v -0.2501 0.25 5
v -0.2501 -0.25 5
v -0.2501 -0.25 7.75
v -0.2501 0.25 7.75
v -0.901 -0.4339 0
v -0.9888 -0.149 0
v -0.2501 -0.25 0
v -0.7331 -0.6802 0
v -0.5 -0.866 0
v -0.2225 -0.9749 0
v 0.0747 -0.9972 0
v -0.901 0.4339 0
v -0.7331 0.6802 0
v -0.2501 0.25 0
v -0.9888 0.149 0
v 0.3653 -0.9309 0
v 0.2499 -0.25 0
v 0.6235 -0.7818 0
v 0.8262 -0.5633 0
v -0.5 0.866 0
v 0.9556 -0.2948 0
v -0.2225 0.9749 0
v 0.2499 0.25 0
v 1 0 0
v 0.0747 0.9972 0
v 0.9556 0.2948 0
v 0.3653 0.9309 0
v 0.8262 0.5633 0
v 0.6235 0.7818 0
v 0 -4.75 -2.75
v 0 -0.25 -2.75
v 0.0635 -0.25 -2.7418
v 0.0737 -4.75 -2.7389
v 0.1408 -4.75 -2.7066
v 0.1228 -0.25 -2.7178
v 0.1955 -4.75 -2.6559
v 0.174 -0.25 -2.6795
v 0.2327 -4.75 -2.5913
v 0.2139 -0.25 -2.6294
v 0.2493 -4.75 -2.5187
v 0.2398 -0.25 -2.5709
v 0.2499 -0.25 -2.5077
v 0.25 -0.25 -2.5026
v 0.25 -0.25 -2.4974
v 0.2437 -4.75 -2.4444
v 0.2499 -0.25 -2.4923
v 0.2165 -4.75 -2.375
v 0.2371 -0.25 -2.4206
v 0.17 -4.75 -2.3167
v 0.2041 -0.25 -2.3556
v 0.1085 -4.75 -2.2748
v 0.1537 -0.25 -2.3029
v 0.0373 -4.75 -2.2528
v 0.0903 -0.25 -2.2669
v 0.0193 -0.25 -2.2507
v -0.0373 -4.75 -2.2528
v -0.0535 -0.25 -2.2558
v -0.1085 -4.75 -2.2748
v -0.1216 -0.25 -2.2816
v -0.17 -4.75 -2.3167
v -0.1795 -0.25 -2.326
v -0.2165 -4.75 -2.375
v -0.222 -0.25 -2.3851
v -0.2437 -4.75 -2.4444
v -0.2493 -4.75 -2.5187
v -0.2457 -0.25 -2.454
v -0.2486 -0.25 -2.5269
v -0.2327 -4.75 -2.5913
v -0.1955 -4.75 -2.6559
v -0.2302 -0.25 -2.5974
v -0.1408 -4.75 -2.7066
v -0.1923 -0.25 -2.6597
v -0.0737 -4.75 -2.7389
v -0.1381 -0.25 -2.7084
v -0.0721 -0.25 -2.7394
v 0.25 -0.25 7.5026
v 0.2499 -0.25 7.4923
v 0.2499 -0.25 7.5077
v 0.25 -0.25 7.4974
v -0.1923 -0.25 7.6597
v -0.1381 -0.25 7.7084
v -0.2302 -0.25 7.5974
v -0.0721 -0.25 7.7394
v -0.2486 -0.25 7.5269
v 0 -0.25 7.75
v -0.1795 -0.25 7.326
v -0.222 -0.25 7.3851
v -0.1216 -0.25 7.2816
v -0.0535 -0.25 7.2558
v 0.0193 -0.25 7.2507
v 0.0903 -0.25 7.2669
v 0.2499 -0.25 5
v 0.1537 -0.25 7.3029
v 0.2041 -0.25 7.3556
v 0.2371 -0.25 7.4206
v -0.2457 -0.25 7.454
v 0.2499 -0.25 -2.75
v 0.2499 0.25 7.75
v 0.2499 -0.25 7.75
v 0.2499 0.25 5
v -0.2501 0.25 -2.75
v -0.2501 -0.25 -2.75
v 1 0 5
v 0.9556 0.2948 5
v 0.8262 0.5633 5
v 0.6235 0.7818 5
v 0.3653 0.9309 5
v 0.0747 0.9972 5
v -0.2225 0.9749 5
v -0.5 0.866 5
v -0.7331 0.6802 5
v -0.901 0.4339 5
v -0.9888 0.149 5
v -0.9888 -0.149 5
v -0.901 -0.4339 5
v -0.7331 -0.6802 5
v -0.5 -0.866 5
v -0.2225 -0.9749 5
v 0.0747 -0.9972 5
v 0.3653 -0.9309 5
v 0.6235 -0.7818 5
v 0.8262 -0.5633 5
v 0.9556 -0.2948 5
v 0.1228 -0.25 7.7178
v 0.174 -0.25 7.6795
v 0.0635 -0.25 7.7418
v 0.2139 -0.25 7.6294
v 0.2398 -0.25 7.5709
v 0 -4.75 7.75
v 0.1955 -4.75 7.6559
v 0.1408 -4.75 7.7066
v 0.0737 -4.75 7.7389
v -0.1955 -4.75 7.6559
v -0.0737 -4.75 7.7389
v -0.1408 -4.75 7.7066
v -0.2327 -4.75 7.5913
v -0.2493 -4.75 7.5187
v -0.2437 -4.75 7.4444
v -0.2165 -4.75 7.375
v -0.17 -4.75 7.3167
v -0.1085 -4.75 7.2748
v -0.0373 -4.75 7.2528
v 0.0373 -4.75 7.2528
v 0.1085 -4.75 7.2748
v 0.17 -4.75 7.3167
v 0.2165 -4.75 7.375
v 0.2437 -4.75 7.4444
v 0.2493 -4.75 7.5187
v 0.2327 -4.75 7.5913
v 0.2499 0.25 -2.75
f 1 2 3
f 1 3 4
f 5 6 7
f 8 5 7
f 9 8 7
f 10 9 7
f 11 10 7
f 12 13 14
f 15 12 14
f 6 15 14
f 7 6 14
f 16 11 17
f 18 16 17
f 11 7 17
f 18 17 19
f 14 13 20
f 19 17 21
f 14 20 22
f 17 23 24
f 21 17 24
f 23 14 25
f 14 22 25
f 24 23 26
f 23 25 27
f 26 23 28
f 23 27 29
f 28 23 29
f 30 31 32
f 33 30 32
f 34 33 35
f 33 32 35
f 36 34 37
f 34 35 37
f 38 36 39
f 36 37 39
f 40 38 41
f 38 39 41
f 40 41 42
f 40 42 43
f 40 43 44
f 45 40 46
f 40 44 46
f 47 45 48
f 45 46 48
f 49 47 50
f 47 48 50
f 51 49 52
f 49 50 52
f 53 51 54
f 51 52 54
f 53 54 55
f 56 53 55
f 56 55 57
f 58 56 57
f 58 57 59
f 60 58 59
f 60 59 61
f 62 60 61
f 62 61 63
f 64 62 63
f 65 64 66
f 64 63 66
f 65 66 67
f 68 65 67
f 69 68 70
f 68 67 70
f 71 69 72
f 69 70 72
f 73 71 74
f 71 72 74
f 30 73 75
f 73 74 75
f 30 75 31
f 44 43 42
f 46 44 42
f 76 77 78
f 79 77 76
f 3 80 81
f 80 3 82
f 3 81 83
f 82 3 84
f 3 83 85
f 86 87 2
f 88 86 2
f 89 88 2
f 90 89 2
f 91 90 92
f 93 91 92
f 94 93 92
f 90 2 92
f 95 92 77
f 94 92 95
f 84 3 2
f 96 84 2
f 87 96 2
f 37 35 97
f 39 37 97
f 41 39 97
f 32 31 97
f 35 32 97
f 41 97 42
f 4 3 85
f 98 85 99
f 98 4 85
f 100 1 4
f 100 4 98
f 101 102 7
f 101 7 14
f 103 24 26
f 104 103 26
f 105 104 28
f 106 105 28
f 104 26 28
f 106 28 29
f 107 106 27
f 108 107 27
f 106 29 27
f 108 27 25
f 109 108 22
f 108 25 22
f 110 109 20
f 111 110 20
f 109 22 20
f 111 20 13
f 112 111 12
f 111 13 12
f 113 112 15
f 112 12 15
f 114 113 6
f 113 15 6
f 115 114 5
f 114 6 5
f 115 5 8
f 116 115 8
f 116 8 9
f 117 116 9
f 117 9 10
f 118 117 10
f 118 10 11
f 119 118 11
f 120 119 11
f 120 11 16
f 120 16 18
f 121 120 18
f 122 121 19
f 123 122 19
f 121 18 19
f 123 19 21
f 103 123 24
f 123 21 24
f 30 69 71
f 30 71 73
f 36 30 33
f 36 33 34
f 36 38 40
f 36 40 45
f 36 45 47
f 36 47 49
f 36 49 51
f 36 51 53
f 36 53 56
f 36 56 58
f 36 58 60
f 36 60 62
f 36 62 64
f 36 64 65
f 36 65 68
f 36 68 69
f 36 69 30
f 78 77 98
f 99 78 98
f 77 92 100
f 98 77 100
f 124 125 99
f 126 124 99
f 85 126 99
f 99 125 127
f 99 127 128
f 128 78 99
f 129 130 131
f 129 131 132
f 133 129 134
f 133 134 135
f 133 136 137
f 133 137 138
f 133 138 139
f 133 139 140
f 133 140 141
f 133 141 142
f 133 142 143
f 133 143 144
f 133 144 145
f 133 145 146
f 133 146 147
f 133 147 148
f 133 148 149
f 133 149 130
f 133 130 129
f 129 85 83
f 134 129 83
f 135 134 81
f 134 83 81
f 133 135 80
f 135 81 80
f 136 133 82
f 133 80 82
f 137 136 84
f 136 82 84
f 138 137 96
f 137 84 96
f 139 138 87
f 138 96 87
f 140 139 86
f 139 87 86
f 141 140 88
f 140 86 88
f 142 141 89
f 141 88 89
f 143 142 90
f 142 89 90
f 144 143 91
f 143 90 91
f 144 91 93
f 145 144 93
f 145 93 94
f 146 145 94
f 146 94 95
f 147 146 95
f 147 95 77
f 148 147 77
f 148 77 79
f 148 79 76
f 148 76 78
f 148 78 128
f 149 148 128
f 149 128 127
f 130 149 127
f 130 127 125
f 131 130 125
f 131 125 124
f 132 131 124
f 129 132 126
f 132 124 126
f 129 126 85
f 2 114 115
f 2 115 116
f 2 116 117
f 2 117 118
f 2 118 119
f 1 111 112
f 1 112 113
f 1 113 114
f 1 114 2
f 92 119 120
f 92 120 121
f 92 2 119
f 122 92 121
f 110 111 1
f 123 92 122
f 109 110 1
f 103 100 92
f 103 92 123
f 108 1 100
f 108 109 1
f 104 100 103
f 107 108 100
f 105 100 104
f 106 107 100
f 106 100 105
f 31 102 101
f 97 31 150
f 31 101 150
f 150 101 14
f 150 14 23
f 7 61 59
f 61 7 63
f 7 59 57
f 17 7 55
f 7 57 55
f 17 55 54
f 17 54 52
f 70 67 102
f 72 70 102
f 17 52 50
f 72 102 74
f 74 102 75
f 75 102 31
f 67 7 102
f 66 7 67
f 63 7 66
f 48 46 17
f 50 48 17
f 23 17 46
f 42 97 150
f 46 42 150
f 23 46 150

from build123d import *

# Parameters (mm, degrees)
SKETCH_1_R           = 1
EXTRUDE_1_DEPTH      = 5
EXTRUDE_2_DEPTH      = 2.75
EXTRUDE_2_DEPTH_BACK = 7.75
SKETCH_2_W           = 0.5
SKETCH_2_H           = 0.5
SKETCH_3_R           = 0.25
EXTRUDE_3_DEPTH      = 4.5


with BuildPart() as part:
    # Эскиз1 → Вытянуть1 (new body)
    with BuildSketch(Plane.XY):
        Circle(SKETCH_1_R)
    extrude(amount=EXTRUDE_1_DEPTH)

    # Эскиз2 → Вытянуть2 (add, two sides: drawn at the far end of the back side and taken through both)
    with BuildSketch(Plane.XY.offset(5).offset(-EXTRUDE_2_DEPTH_BACK)):
        with Locations((-0.000117439, 0)):
            Rectangle(SKETCH_2_W, SKETCH_2_H)
    extrude(amount=EXTRUDE_2_DEPTH + EXTRUDE_2_DEPTH_BACK)

    # Эскиз3 → Вытянуть3 (add)
    with BuildSketch(Plane.XZ.offset(0.25)):
        with Locations((0, 7.5)):
            Circle(SKETCH_3_R)
        with Locations((0, -2.5)):
            Circle(SKETCH_3_R)
    extrude(amount=EXTRUDE_3_DEPTH)


solid = part.part
